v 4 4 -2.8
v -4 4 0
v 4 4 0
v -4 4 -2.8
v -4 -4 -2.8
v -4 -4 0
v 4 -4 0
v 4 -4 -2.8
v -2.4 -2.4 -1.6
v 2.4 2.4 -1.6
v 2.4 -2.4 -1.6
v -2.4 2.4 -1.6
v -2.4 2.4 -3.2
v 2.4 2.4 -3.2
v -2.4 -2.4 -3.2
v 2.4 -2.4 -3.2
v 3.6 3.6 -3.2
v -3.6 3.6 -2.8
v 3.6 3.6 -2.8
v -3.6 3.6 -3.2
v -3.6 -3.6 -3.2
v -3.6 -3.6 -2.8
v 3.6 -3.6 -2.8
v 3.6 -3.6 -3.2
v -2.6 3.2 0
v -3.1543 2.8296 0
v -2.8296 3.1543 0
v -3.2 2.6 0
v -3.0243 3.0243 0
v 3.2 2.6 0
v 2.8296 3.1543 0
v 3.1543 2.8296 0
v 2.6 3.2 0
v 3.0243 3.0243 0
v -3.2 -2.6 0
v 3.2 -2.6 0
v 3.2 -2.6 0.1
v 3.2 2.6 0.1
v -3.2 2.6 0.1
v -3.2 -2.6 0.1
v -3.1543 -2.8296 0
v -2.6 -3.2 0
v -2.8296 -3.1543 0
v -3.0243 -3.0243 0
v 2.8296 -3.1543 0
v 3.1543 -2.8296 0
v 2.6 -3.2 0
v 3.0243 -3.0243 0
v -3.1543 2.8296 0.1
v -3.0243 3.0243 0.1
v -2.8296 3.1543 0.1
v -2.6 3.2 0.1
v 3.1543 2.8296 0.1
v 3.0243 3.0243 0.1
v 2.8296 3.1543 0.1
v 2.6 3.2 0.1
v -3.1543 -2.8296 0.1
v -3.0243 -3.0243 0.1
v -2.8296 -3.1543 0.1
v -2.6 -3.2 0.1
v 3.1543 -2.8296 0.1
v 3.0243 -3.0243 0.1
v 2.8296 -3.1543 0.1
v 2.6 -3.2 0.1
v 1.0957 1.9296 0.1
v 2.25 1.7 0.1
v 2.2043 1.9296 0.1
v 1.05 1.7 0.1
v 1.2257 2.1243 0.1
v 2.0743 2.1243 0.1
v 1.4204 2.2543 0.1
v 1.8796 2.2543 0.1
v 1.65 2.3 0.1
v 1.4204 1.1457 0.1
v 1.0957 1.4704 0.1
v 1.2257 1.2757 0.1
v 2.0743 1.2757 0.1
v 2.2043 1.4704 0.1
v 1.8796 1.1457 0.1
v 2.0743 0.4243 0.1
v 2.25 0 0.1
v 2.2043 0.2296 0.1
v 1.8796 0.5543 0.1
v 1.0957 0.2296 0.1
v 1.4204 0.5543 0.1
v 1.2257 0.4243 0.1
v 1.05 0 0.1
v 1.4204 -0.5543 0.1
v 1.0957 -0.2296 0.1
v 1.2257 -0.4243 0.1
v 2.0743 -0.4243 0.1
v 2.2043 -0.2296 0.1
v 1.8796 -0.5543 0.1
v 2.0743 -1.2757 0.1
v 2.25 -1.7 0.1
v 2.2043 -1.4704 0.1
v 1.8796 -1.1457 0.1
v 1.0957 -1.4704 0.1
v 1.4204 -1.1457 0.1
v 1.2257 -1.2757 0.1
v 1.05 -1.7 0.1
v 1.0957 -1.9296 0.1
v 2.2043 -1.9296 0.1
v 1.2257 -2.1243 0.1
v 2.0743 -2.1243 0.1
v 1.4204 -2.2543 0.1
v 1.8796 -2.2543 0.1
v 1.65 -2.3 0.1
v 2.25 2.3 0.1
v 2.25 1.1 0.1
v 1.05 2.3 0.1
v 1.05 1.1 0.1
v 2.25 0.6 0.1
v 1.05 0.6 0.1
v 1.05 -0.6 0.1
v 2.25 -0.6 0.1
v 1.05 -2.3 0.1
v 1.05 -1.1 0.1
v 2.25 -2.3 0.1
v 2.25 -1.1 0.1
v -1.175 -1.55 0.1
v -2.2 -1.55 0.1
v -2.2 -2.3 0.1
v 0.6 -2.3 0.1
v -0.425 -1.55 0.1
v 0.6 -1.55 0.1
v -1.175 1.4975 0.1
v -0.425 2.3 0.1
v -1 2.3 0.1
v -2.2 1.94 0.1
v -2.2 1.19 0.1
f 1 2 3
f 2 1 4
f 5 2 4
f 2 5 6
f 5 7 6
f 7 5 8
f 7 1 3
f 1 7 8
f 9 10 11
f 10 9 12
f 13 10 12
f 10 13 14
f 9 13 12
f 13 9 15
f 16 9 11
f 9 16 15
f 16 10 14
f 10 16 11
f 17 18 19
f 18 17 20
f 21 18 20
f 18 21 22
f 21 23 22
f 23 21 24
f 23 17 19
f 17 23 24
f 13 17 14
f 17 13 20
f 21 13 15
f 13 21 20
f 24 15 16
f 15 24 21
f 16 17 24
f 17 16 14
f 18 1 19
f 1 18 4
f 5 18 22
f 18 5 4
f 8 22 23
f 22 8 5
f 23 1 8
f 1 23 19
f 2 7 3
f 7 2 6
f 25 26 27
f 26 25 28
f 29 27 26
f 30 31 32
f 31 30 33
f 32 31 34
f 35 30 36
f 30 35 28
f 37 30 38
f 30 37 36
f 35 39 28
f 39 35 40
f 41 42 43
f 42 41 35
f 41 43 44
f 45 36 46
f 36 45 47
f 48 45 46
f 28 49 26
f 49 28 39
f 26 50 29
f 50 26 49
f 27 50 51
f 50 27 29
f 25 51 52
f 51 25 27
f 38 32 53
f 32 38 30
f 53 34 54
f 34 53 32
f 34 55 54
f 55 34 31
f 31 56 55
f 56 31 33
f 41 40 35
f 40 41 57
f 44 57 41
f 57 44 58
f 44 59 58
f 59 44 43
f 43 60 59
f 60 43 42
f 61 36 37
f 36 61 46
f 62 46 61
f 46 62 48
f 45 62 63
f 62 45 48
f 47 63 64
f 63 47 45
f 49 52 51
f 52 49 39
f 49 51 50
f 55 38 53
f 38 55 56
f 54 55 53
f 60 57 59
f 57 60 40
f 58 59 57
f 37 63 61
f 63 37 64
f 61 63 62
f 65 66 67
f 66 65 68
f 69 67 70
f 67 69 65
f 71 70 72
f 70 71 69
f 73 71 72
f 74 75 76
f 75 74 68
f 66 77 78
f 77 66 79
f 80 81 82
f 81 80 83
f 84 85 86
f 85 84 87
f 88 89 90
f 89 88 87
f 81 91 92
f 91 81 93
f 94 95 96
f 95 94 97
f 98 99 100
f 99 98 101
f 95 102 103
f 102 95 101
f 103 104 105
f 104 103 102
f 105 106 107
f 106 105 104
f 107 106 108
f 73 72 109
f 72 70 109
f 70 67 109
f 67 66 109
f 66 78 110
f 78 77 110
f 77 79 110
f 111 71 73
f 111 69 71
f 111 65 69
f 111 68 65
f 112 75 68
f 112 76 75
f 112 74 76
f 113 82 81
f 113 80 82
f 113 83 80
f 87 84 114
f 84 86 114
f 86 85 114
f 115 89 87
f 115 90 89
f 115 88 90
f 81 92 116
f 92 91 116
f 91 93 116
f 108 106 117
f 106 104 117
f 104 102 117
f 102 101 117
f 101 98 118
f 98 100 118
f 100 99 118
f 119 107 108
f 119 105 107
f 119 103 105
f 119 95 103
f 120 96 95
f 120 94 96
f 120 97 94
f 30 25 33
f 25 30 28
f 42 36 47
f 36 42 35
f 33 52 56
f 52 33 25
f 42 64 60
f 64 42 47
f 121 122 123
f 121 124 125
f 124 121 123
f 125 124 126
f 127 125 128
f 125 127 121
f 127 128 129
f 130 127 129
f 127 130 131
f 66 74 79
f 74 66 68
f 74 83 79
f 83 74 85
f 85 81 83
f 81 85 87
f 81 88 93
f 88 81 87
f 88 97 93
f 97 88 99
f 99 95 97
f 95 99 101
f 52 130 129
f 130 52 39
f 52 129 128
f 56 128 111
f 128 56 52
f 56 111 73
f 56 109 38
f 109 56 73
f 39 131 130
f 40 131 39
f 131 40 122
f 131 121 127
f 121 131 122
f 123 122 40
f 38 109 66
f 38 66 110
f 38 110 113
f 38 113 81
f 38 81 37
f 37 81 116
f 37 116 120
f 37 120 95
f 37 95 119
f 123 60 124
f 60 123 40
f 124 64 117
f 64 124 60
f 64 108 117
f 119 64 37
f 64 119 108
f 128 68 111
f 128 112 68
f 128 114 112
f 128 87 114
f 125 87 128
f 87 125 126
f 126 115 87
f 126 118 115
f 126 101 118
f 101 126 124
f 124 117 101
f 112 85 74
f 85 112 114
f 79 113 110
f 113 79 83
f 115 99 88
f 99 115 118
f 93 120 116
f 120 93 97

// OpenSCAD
// file: ../p/box5.scad
use <../lib.scad>
function ldraw_lib__box5() = [
// 0 Box with 5 Faces and All Edges
// 0 Name: box5.dat
// 0 Author: James Jessiman
// 0 !LDRAW_ORG Primitive UPDATE 2012-01
// 0 !LICENSE Licensed under CC BY 4.0 : see CAreadme.txt
// 
// 0 BFC CERTIFY CCW
  [0,"BFC","CERTIFY"],
  [0,"BFC","CCW"],
// 
// 0 !HISTORY 2002-04-03 [sbliss] Modified for BFC compliance
// 0 !HISTORY 2002-04-25 [PTadmin] Official Update 2002-02
// 0 !HISTORY 2007-06-24 [PTadmin] Header formatted for Contributor Agreement
// 0 !HISTORY 2008-07-01 [PTadmin] Official Update 2008-01
// 0 !HISTORY 2012-02-16 [Philo] Changed to CCW
// 0 !HISTORY 2012-03-30 [PTadmin] Official Update 2012-01
// 
// 
// 2 24 1 1 1 -1 1 1
  [2,24,1,1,1,-1,1,1],
// 2 24 -1 1 1 -1 1 -1
  [2,24,-1,1,1,-1,1,-1],
// 2 24 -1 1 -1 1 1 -1
  [2,24,-1,1,-1,1,1,-1],
// 2 24 1 1 -1 1 1 1
  [2,24,1,1,-1,1,1,1],
// 2 24 1 0 1 -1 0 1
  [2,24,1,0,1,-1,0,1],
// 2 24 -1 0 1 -1 0 -1
  [2,24,-1,0,1,-1,0,-1],
// 2 24 -1 0 -1 1 0 -1
  [2,24,-1,0,-1,1,0,-1],
// 2 24 1 0 -1 1 0 1
  [2,24,1,0,-1,1,0,1],
// 2 24 1 0 1 1 1 1
  [2,24,1,0,1,1,1,1],
// 2 24 -1 0 1 -1 1 1
  [2,24,-1,0,1,-1,1,1],
// 2 24 1 0 -1 1 1 -1
  [2,24,1,0,-1,1,1,-1],
// 2 24 -1 0 -1 -1 1 -1
  [2,24,-1,0,-1,-1,1,-1],
// 4 16 -1 1 1 1 1 1 1 1 -1 -1 1 -1
  [4,16,-1,1,1,1,1,1,1,1,-1,-1,1,-1],
// 4 16 -1 1 1 -1 0 1 1 0 1 1 1 1
  [4,16,-1,1,1,-1,0,1,1,0,1,1,1,1],
// 4 16 -1 1 -1 -1 0 -1 -1 0 1 -1 1 1
  [4,16,-1,1,-1,-1,0,-1,-1,0,1,-1,1,1],
// 4 16 1 1 -1 1 0 -1 -1 0 -1 -1 1 -1
  [4,16,1,1,-1,1,0,-1,-1,0,-1,-1,1,-1],
// 4 16 1 1 1 1 0 1 1 0 -1 1 1 -1
  [4,16,1,1,1,1,0,1,1,0,-1,1,1,-1],
];
module ldraw_lib__box5(step=0, col=false, unit=2/5, alt=false, line=0.2, solid=!$preview)
    makepoly(ldraw_lib__box5(), step=step, col=col, unit=unit, alt=alt, line=line, solid=solid);
ldraw_lib__box5(line=0.2);
// file: ../p/box4.scad
use <../lib.scad>
function ldraw_lib__box4() = [
// 0 Box with 4 Faces (2 Parallel Pairs) and All Edges
// 0 Name: box4.dat
// 0 Author: James Jessiman
// 0 !LDRAW_ORG Primitive UPDATE 2012-01
// 0 !LICENSE Licensed under CC BY 4.0 : see CAreadme.txt
// 
// 0 BFC CERTIFY CCW
  [0,"BFC","CERTIFY"],
  [0,"BFC","CCW"],
// 
// 0 !HISTORY 2002-04-03 [sbliss] Modified for BFC compliance
// 0 !HISTORY 2002-04-25 [PTadmin] Official Update 2002-02
// 0 !HISTORY 2007-06-24 [PTadmin] Header formatted for Contributor Agreement
// 0 !HISTORY 2008-07-01 [PTadmin] Official Update 2008-01
// 0 !HISTORY 2012-02-16 [Philo] Changed to CCW
// 0 !HISTORY 2012-03-30 [PTadmin] Official Update 2012-01
// 
// 
// 2 24 1 1 1 -1 1 1
  [2,24,1,1,1,-1,1,1],
// 2 24 -1 1 1 -1 1 -1
  [2,24,-1,1,1,-1,1,-1],
// 2 24 -1 1 -1 1 1 -1
  [2,24,-1,1,-1,1,1,-1],
// 2 24 1 1 -1 1 1 1
  [2,24,1,1,-1,1,1,1],
// 2 24 1 0 1 -1 0 1
  [2,24,1,0,1,-1,0,1],
// 2 24 -1 0 1 -1 0 -1
  [2,24,-1,0,1,-1,0,-1],
// 2 24 -1 0 -1 1 0 -1
  [2,24,-1,0,-1,1,0,-1],
// 2 24 1 0 -1 1 0 1
  [2,24,1,0,-1,1,0,1],
// 2 24 1 0 1 1 1 1
  [2,24,1,0,1,1,1,1],
// 2 24 -1 0 1 -1 1 1
  [2,24,-1,0,1,-1,1,1],
// 2 24 1 0 -1 1 1 -1
  [2,24,1,0,-1,1,1,-1],
// 2 24 -1 0 -1 -1 1 -1
  [2,24,-1,0,-1,-1,1,-1],
// 4 16 -1 1 1 -1 0 1 1 0 1 1 1 1
  [4,16,-1,1,1,-1,0,1,1,0,1,1,1,1],
// 4 16 -1 1 -1 -1 0 -1 -1 0 1 -1 1 1
  [4,16,-1,1,-1,-1,0,-1,-1,0,1,-1,1,1],
// 4 16 1 1 -1 1 0 -1 -1 0 -1 -1 1 -1
  [4,16,1,1,-1,1,0,-1,-1,0,-1,-1,1,-1],
// 4 16 1 1 1 1 0 1 1 0 -1 1 1 -1
  [4,16,1,1,1,1,0,1,1,0,-1,1,1,-1],
];
module ldraw_lib__box4(step=0, col=false, unit=2/5, alt=false, line=0.2, solid=!$preview)
    makepoly(ldraw_lib__box4(), step=step, col=col, unit=unit, alt=alt, line=line, solid=solid);
ldraw_lib__box4(line=0.2);
// file: ../p/box3u12.scad
use <../lib.scad>
function ldraw_lib__box3u12() = [
// 0 Box with 3 Parallel Faces without Any Edges
// 0 Name: box3u12.dat
// 0 Author: J.C. Tchang [tchang]
// 0 !LDRAW_ORG Primitive UPDATE 2014-02
// 0 !LICENSE Licensed under CC BY 4.0 : see CAreadme.txt
// 
// 0 BFC CERTIFY CCW
  [0,"BFC","CERTIFY"],
  [0,"BFC","CCW"],
// 
// 0 !HISTORY 2014-12-23 [PTadmin] Official Update 2014-02
// 
// 
// 4 16 -1 1 1 1 1 1 1 1 -1 -1 1 -1
  [4,16,-1,1,1,1,1,1,1,1,-1,-1,1,-1],
// 4 16 -1 1 1 -1 0 1 1 0 1 1 1 1
  [4,16,-1,1,1,-1,0,1,1,0,1,1,1,1],
// 4 16 1 1 -1 1 0 -1 -1 0 -1 -1 1 -1
  [4,16,1,1,-1,1,0,-1,-1,0,-1,-1,1,-1],
];
module ldraw_lib__box3u12(step=0, col=false, unit=2/5, alt=false, line=0.2, solid=!$preview)
    makepoly(ldraw_lib__box3u12(), step=step, col=col, unit=unit, alt=alt, line=line, solid=solid);
ldraw_lib__box3u12(line=0.2);
// file: ../p/7-16ndis.scad
use <../lib.scad>
function ldraw_lib__7_16ndis() = [
// 0 Disc Negative 0.4375
// 0 Name: 7-16ndis.dat
// 0 Author: Alex Taylor [anathema]
// 0 !LDRAW_ORG Primitive UPDATE 2010-01
// 0 !LICENSE Licensed under CC BY 4.0 : see CAreadme.txt
// 
// 0 BFC CERTIFY CCW
  [0,"BFC","CERTIFY"],
  [0,"BFC","CCW"],
// 
// 0 !HISTORY 2010-04-05 [PTadmin] Official Update 2010-01
// 
// 
// 3 16 1 0 1 0.9239 0 0.3827 1 0 0
  [3,16,1,0,1,0.9239,0,0.3827,1,0,0],
// 3 16 1 0 1 0.7071 0 0.7071 0.9239 0 0.3827
  [3,16,1,0,1,0.7071,0,0.7071,0.9239,0,0.3827],
// 3 16 1 0 1 0.3827 0 0.9239 0.7071 0 0.7071
  [3,16,1,0,1,0.3827,0,0.9239,0.7071,0,0.7071],
// 3 16 1 0 1 0 0 1 0.3827 0 0.9239
  [3,16,1,0,1,0,0,1,0.3827,0,0.9239],
// 3 16 -1 0 1 -0.3827 0 0.9239 0 0 1
  [3,16,-1,0,1,-0.3827,0,0.9239,0,0,1],
// 3 16 -1 0 1 -0.7071 0 0.7071 -0.3827 0 0.9239
  [3,16,-1,0,1,-0.7071,0,0.7071,-0.3827,0,0.9239],
// 3 16 -1 0 1 -0.9239 0 0.3827 -0.7071 0 0.7071
  [3,16,-1,0,1,-0.9239,0,0.3827,-0.7071,0,0.7071],
// 0
];
module ldraw_lib__7_16ndis(step=0, col=false, unit=2/5, alt=false, line=0.2, solid=!$preview)
    makepoly(ldraw_lib__7_16ndis(), step=step, col=col, unit=unit, alt=alt, line=line, solid=solid);
ldraw_lib__7_16ndis(line=0.2);
// file: ../p/3-16ndis.scad
use <../lib.scad>
function ldraw_lib__3_16ndis() = [
// 0 Disc Negative 0.1875
// 0 Name: 3-16ndis.dat
// 0 Author: Magnus Forsberg [MagFors]
// 0 !LDRAW_ORG Primitive UPDATE 2024-01
// 0 !LICENSE Licensed under CC BY 4.0 : see CAreadme.txt
// 
// 0 BFC CERTIFY CCW
  [0,"BFC","CERTIFY"],
  [0,"BFC","CCW"],
// 
// 0 !HISTORY 2009-05-02 [PTadmin] Official Update 2009-01
// 0 !HISTORY 2024-01-03 [MagFors] Complete regeneration, original by guyvivan
// 0 !HISTORY 2024-01-29 [OrionP] Official Update 2024-01
// 
// 3 16 1 0 1 0.9239 0 0.3827 1 0 0
  [3,16,1,0,1,0.9239,0,0.3827,1,0,0],
// 3 16 1 0 1 0.7071 0 0.7071 0.9239 0 0.3827
  [3,16,1,0,1,0.7071,0,0.7071,0.9239,0,0.3827],
// 3 16 1 0 1 0.3827 0 0.9239 0.7071 0 0.7071
  [3,16,1,0,1,0.3827,0,0.9239,0.7071,0,0.7071],
// 0 // Build by LDPartEditor (PrimGen 2.X)
];
module ldraw_lib__3_16ndis(step=0, col=false, unit=2/5, alt=false, line=0.2, solid=!$preview)
    makepoly(ldraw_lib__3_16ndis(), step=step, col=col, unit=unit, alt=alt, line=line, solid=solid);
ldraw_lib__3_16ndis(line=0.2);
// file: ../p/3-16chrd.scad
use <../lib.scad>
function ldraw_lib__3_16chrd() = [
// 0 Chord 0.1875
// 0 Name: 3-16chrd.dat
// 0 Author: Niels Karsdorp [nielsk]
// 0 !LDRAW_ORG Primitive UPDATE 2009-01
// 0 !LICENSE Licensed under CC BY 4.0 : see CAreadme.txt
// 
// 0 BFC CERTIFY CCW
  [0,"BFC","CERTIFY"],
  [0,"BFC","CCW"],
// 
// 0 !HISTORY 2009-05-02 [PTadmin] Official Update 2009-01
// 
// 
// 4 16 1 0 0 0.9239 0 0.3827 0.7071 0 0.7071 0.3827 0 0.9239
  [4,16,1,0,0,0.9239,0,0.3827,0.7071,0,0.7071,0.3827,0,0.9239],
// 0
// 
];
module ldraw_lib__3_16chrd(step=0, col=false, unit=2/5, alt=false, line=0.2, solid=!$preview)
    makepoly(ldraw_lib__3_16chrd(), step=step, col=col, unit=unit, alt=alt, line=line, solid=solid);
ldraw_lib__3_16chrd(line=0.2);
// file: ../p/2-4chrd.scad
use <../lib.scad>
function ldraw_lib__2_4chrd() = [
// 0 Chord 0.5
// 0 Name: 2-4chrd.dat
// 0 Author: Philippe Hurbain [Philo]
// 0 !LDRAW_ORG Primitive UPDATE 2014-01
// 0 !LICENSE Licensed under CC BY 4.0 : see CAreadme.txt
// 
// 0 BFC CERTIFY CCW
  [0,"BFC","CERTIFY"],
  [0,"BFC","CCW"],
// 
// 0 !HISTORY 2014-06-21 [PTadmin] Official Update 2014-01
// 
// 
// 4 16 0.9239 0 0.3827 -0.9239 0 0.3827 -1 0 0 1 0 0
  [4,16,0.9239,0,0.3827,-0.9239,0,0.3827,-1,0,0,1,0,0],
// 4 16 0.7071 0 0.7071 -0.7071 0 0.7071 -0.9239 0 0.3827 0.9239 0 0.3827
  [4,16,0.7071,0,0.7071,-0.7071,0,0.7071,-0.9239,0,0.3827,0.9239,0,0.3827],
// 4 16 0.3827 0 0.9239 -0.3827 0 0.9239 -0.7071 0 0.7071 0.7071 0 0.7071
  [4,16,0.3827,0,0.9239,-0.3827,0,0.9239,-0.7071,0,0.7071,0.7071,0,0.7071],
// 3 16 0 0 1 -0.3827 0 0.9239 0.3827 0 0.9239
  [3,16,0,0,1,-0.3827,0,0.9239,0.3827,0,0.9239],
];
module ldraw_lib__2_4chrd(step=0, col=false, unit=2/5, alt=false, line=0.2, solid=!$preview)
    makepoly(ldraw_lib__2_4chrd(), step=step, col=col, unit=unit, alt=alt, line=line, solid=solid);
ldraw_lib__2_4chrd(line=0.2);
// file: ../p/1-4cyli.scad
use <../lib.scad>
function ldraw_lib__1_4cyli() = [
// 0 Cylinder 0.25
// 0 Name: 1-4cyli.dat
// 0 Author: James Jessiman
// 0 !LDRAW_ORG Primitive UPDATE 2012-01
// 0 !LICENSE Licensed under CC BY 4.0 : see CAreadme.txt
// 
// 0 BFC CERTIFY CCW
  [0,"BFC","CERTIFY"],
  [0,"BFC","CCW"],
// 
// 0 !HISTORY 2002-03-23 [sbliss] Added BFC statement.
// 0 !HISTORY 2002-04-25 [PTadmin] Official Update 2002-02
// 0 !HISTORY 2007-06-22 [PTadmin] Header formatted for Contributor Agreement
// 0 !HISTORY 2008-07-01 [PTadmin] Official Update 2008-01
// 0 !HISTORY 2012-02-16 [Philo] Changed to CCW
// 0 !HISTORY 2012-03-30 [PTadmin] Official Update 2012-01
// 
// 
// 4 16 1 1 0 0.9239 1 0.3827 0.9239 0 0.3827 1 0 0
  [4,16,1,1,0,0.9239,1,0.3827,0.9239,0,0.3827,1,0,0],
// 5 24 1 0 0 1 1 0 0.9239 0 0.3827 1 0 -1
  [5,24,1,0,0,1,1,0,0.9239,0,0.3827,1,0,-1],
// 4 16 0.9239 1 0.3827 0.7071 1 0.7071 0.7071 0 0.7071 0.9239 0 0.3827
  [4,16,0.9239,1,0.3827,0.7071,1,0.7071,0.7071,0,0.7071,0.9239,0,0.3827],
// 5 24 0.9239 0 0.3827 0.9239 1 0.3827 0.7071 0 0.7071 1 0 0
  [5,24,0.9239,0,0.3827,0.9239,1,0.3827,0.7071,0,0.7071,1,0,0],
// 4 16 0.7071 1 0.7071 0.3827 1 0.9239 0.3827 0 0.9239 0.7071 0 0.7071
  [4,16,0.7071,1,0.7071,0.3827,1,0.9239,0.3827,0,0.9239,0.7071,0,0.7071],
// 5 24 0.7071 0 0.7071 0.7071 1 0.7071 0.3827 0 0.9239 0.9239 0 0.3827
  [5,24,0.7071,0,0.7071,0.7071,1,0.7071,0.3827,0,0.9239,0.9239,0,0.3827],
// 4 16 0.3827 1 0.9239 0 1 1 0 0 1 0.3827 0 0.9239
  [4,16,0.3827,1,0.9239,0,1,1,0,0,1,0.3827,0,0.9239],
// 5 24 0.3827 0 0.9239 0.3827 1 0.9239 0 0 1 0.7071 0 0.7071
  [5,24,0.3827,0,0.9239,0.3827,1,0.9239,0,0,1,0.7071,0,0.7071],
// 5 24 0 0 1 0 1 1 0.3827 0 0.9239 -1 0 1
  [5,24,0,0,1,0,1,1,0.3827,0,0.9239,-1,0,1],
];
module ldraw_lib__1_4cyli(step=0, col=false, unit=2/5, alt=false, line=0.2, solid=!$preview)
    makepoly(ldraw_lib__1_4cyli(), step=step, col=col, unit=unit, alt=alt, line=line, solid=solid);
ldraw_lib__1_4cyli(line=0.2);
// file: ../p/1-4chrd.scad
use <../lib.scad>
function ldraw_lib__1_4chrd() = [
// 0 Chord 0.25
// 0 Name: 1-4chrd.dat
// 0 Author: Max Martin Richter [MMR1988]
// 0 !LDRAW_ORG Primitive UPDATE 2023-05
// 0 !LICENSE Licensed under CC BY 4.0 : see CAreadme.txt
// 
// 0 BFC CERTIFY CCW
  [0,"BFC","CERTIFY"],
  [0,"BFC","CCW"],
// 
// 0 !HISTORY 2004-04-22 [PTadmin] Official Update 2004-02
// 0 !HISTORY 2007-10-09 [PTadmin] Header formatted for Contributor Agreement
// 0 !HISTORY 2008-07-01 [PTadmin] Official Update 2008-01
// 0 !HISTORY 2012-08-02 [MMR1988] Re-creation with PrimGen2 and Rectifier
// 0 !HISTORY 2012-08-09 [PTadmin] Official Update 2012-02
// 0 !HISTORY 2023-10-27 [OrionP] Change author to MMR1988 from hafhead
// 0 !HISTORY 2023-10-31 [OrionP] Official Update 2023-05
// 
// 4 16 0.9239 0 0.3827 0.3827 0 0.9239 0 0 1 1 0 0
  [4,16,0.9239,0,0.3827,0.3827,0,0.9239,0,0,1,1,0,0],
// 3 16 0.7071 0 0.7071 0.3827 0 0.9239 0.9239 0 0.3827
  [3,16,0.7071,0,0.7071,0.3827,0,0.9239,0.9239,0,0.3827],
];
module ldraw_lib__1_4chrd(step=0, col=false, unit=2/5, alt=false, line=0.2, solid=!$preview)
    makepoly(ldraw_lib__1_4chrd(), step=step, col=col, unit=unit, alt=alt, line=line, solid=solid);
ldraw_lib__1_4chrd(line=0.2);
// file: s/3070bs01.scad
use <../../lib.scad>
use <../../p/box4.scad>
use <../../p/box5.scad>
function ldraw_lib__s__3070bs01() = [
// 0 ~Tile  1 x  1 with Groove without Top Face
// 0 Name: s\3070bs01.dat
// 0 Author: Chris Dee [cwdee]
// 0 !LDRAW_ORG Subpart UPDATE 2009-02
// 0 !LICENSE Licensed under CC BY 4.0 : see CAreadme.txt
// 
// 0 BFC CERTIFY CCW
  [0,"BFC","CERTIFY"],
  [0,"BFC","CCW"],
// 
// 0 !HISTORY 2009-09-03 [PTadmin] Official Update 2009-02
// 
// 
// 1 16 0 0 0 10 0 0 0 7 0 0 0 10 box4.dat
  [1,16,0,0,0,10,0,0,0,7,0,0,0,10, ldraw_lib__box4()],
// 0 BFC INVERTNEXT
  [0,"BFC","INVERTNEXT"],
// 1 16 0 8 0 6 0 0 0 -4 0 0 0 6 box5.dat
  [1,16,0,8,0,6,0,0,0,-4,0,0,0,6, ldraw_lib__box5()],
// 1 16 0 7 0 9 0 0 0 1 0 0 0 9 box4.dat
  [1,16,0,7,0,9,0,0,0,1,0,0,0,9, ldraw_lib__box4()],
// 
// 4 16 9 8 9 6 8 6 -6 8 6 -9 8 9
  [4,16,9,8,9,6,8,6,-6,8,6,-9,8,9],
// 4 16 -9 8 9 -6 8 6 -6 8 -6 -9 8 -9
  [4,16,-9,8,9,-6,8,6,-6,8,-6,-9,8,-9],
// 4 16 -9 8 -9 -6 8 -6 6 8 -6 9 8 -9
  [4,16,-9,8,-9,-6,8,-6,6,8,-6,9,8,-9],
// 4 16 9 8 -9 6 8 -6 6 8 6 9 8 9
  [4,16,9,8,-9,6,8,-6,6,8,6,9,8,9],
// 
// 4 16 10 7 10 9 7 9 -9 7 9 -10 7 10
  [4,16,10,7,10,9,7,9,-9,7,9,-10,7,10],
// 4 16 -10 7 10 -9 7 9 -9 7 -9 -10 7 -10
  [4,16,-10,7,10,-9,7,9,-9,7,-9,-10,7,-10],
// 4 16 -10 7 -10 -9 7 -9 9 7 -9 10 7 -10
  [4,16,-10,7,-10,-9,7,-9,9,7,-9,10,7,-10],
// 4 16 10 7 -10 9 7 -9 9 7 9 10 7 10
  [4,16,10,7,-10,9,7,-9,9,7,9,10,7,10],
// 0
];
module ldraw_lib__s__3070bs01(step=0, col=false, unit=2/5, alt=false, line=0.2, solid=!$preview)
    makepoly(ldraw_lib__s__3070bs01(), step=step, col=col, unit=unit, alt=alt, line=line, solid=solid);
ldraw_lib__s__3070bs01(line=0.2);
// file: 3070b.scad
use <../lib.scad>
use <s/3070bs01.scad>
function ldraw_lib__3070b() = [
// 0 Tile  1 x  1 with Groove
// 0 Name: 3070b.dat
// 0 Author: Chris Dee [cwdee]
// 0 !LDRAW_ORG Part UPDATE 2025-09
// 0 !LICENSE Licensed under CC BY 4.0 : see CAreadme.txt
// 
// 0 BFC CERTIFY CCW
  [0,"BFC","CERTIFY"],
  [0,"BFC","CCW"],
// 
// 0 !KEYWORDS BrickLink 3070
// 
// 0 !HISTORY 2009-09-03 [PTadmin] Official Update 2009-02
// 0 !HISTORY 2025-09-27 [OrionP] Changed winding to CCW
// 0 !HISTORY 2025-09-29 [OrionP] Official Update 2025-09
// 
// 1 16 0 0 0 1 0 0 0 1 0 0 0 1 s\3070bs01.dat
  [1,16,0,0,0,1,0,0,0,1,0,0,0,1, ldraw_lib__s__3070bs01()],
// 4 16 -10 0 10 -10 0 -10 10 0 -10 10 0 10
  [4,16,-10,0,10,-10,0,-10,10,0,-10,10,0,10],
// 0
];
module ldraw_lib__3070b(step=0, col=false, unit=2/5, alt=false, line=0.2, solid=!$preview)
    makepoly(ldraw_lib__3070b(), step=step, col=col, unit=unit, alt=alt, line=line, solid=solid);
ldraw_lib__3070b(line=0.2);
// main file
use <../lib.scad>
use <3070b.scad>
use <6142275b.scad>
function ldraw_lib__3070bd04() = [
// 0 Tile  1 x  1 with White Number 1 and  3 Dark Grey Circles Right on Red Background Sticker
// 0 Name: 3070bd04.dat
// 0 Author: Vincent Messenet [Cheenzo]
// 0 !LDRAW_ORG Shortcut UPDATE 2026-05
// 0 !LICENSE Licensed under CC BY 4.0 : see CAreadme.txt
// 
// 0 BFC CERTIFY CCW
  [0,"BFC","CERTIFY"],
  [0,"BFC","CCW"],
// 
// 0 !CATEGORY Sticker Shortcut
// 
// 0 !KEYWORDS Bricklink 3070pb266L, Set 75872
// 
// 0 !HISTORY 2026-05-31 [OrionP] Official Update 2026-05
// 
// 1 16 0 0 0 1 0 0 0 1 0 0 0 1 3070b.dat
  [1,16,0,0,0,1,0,0,0,1,0,0,0,1, ldraw_lib__3070b()],
// 1 16 0 0 0 1 0 0 0 1 0 0 0 1 6142275b.dat
  [1,16,0,0,0,1,0,0,0,1,0,0,0,1, ldraw_lib__6142275b()],
];
module ldraw_lib__3070bd04(step=0, col=false, unit=2/5, alt=false, line=0.2, solid=!$preview)
    makepoly(ldraw_lib__3070bd04(), step=step, col=col, unit=unit, alt=alt, line=line, solid=solid);
ldraw_lib__3070bd04(line=0.2);
